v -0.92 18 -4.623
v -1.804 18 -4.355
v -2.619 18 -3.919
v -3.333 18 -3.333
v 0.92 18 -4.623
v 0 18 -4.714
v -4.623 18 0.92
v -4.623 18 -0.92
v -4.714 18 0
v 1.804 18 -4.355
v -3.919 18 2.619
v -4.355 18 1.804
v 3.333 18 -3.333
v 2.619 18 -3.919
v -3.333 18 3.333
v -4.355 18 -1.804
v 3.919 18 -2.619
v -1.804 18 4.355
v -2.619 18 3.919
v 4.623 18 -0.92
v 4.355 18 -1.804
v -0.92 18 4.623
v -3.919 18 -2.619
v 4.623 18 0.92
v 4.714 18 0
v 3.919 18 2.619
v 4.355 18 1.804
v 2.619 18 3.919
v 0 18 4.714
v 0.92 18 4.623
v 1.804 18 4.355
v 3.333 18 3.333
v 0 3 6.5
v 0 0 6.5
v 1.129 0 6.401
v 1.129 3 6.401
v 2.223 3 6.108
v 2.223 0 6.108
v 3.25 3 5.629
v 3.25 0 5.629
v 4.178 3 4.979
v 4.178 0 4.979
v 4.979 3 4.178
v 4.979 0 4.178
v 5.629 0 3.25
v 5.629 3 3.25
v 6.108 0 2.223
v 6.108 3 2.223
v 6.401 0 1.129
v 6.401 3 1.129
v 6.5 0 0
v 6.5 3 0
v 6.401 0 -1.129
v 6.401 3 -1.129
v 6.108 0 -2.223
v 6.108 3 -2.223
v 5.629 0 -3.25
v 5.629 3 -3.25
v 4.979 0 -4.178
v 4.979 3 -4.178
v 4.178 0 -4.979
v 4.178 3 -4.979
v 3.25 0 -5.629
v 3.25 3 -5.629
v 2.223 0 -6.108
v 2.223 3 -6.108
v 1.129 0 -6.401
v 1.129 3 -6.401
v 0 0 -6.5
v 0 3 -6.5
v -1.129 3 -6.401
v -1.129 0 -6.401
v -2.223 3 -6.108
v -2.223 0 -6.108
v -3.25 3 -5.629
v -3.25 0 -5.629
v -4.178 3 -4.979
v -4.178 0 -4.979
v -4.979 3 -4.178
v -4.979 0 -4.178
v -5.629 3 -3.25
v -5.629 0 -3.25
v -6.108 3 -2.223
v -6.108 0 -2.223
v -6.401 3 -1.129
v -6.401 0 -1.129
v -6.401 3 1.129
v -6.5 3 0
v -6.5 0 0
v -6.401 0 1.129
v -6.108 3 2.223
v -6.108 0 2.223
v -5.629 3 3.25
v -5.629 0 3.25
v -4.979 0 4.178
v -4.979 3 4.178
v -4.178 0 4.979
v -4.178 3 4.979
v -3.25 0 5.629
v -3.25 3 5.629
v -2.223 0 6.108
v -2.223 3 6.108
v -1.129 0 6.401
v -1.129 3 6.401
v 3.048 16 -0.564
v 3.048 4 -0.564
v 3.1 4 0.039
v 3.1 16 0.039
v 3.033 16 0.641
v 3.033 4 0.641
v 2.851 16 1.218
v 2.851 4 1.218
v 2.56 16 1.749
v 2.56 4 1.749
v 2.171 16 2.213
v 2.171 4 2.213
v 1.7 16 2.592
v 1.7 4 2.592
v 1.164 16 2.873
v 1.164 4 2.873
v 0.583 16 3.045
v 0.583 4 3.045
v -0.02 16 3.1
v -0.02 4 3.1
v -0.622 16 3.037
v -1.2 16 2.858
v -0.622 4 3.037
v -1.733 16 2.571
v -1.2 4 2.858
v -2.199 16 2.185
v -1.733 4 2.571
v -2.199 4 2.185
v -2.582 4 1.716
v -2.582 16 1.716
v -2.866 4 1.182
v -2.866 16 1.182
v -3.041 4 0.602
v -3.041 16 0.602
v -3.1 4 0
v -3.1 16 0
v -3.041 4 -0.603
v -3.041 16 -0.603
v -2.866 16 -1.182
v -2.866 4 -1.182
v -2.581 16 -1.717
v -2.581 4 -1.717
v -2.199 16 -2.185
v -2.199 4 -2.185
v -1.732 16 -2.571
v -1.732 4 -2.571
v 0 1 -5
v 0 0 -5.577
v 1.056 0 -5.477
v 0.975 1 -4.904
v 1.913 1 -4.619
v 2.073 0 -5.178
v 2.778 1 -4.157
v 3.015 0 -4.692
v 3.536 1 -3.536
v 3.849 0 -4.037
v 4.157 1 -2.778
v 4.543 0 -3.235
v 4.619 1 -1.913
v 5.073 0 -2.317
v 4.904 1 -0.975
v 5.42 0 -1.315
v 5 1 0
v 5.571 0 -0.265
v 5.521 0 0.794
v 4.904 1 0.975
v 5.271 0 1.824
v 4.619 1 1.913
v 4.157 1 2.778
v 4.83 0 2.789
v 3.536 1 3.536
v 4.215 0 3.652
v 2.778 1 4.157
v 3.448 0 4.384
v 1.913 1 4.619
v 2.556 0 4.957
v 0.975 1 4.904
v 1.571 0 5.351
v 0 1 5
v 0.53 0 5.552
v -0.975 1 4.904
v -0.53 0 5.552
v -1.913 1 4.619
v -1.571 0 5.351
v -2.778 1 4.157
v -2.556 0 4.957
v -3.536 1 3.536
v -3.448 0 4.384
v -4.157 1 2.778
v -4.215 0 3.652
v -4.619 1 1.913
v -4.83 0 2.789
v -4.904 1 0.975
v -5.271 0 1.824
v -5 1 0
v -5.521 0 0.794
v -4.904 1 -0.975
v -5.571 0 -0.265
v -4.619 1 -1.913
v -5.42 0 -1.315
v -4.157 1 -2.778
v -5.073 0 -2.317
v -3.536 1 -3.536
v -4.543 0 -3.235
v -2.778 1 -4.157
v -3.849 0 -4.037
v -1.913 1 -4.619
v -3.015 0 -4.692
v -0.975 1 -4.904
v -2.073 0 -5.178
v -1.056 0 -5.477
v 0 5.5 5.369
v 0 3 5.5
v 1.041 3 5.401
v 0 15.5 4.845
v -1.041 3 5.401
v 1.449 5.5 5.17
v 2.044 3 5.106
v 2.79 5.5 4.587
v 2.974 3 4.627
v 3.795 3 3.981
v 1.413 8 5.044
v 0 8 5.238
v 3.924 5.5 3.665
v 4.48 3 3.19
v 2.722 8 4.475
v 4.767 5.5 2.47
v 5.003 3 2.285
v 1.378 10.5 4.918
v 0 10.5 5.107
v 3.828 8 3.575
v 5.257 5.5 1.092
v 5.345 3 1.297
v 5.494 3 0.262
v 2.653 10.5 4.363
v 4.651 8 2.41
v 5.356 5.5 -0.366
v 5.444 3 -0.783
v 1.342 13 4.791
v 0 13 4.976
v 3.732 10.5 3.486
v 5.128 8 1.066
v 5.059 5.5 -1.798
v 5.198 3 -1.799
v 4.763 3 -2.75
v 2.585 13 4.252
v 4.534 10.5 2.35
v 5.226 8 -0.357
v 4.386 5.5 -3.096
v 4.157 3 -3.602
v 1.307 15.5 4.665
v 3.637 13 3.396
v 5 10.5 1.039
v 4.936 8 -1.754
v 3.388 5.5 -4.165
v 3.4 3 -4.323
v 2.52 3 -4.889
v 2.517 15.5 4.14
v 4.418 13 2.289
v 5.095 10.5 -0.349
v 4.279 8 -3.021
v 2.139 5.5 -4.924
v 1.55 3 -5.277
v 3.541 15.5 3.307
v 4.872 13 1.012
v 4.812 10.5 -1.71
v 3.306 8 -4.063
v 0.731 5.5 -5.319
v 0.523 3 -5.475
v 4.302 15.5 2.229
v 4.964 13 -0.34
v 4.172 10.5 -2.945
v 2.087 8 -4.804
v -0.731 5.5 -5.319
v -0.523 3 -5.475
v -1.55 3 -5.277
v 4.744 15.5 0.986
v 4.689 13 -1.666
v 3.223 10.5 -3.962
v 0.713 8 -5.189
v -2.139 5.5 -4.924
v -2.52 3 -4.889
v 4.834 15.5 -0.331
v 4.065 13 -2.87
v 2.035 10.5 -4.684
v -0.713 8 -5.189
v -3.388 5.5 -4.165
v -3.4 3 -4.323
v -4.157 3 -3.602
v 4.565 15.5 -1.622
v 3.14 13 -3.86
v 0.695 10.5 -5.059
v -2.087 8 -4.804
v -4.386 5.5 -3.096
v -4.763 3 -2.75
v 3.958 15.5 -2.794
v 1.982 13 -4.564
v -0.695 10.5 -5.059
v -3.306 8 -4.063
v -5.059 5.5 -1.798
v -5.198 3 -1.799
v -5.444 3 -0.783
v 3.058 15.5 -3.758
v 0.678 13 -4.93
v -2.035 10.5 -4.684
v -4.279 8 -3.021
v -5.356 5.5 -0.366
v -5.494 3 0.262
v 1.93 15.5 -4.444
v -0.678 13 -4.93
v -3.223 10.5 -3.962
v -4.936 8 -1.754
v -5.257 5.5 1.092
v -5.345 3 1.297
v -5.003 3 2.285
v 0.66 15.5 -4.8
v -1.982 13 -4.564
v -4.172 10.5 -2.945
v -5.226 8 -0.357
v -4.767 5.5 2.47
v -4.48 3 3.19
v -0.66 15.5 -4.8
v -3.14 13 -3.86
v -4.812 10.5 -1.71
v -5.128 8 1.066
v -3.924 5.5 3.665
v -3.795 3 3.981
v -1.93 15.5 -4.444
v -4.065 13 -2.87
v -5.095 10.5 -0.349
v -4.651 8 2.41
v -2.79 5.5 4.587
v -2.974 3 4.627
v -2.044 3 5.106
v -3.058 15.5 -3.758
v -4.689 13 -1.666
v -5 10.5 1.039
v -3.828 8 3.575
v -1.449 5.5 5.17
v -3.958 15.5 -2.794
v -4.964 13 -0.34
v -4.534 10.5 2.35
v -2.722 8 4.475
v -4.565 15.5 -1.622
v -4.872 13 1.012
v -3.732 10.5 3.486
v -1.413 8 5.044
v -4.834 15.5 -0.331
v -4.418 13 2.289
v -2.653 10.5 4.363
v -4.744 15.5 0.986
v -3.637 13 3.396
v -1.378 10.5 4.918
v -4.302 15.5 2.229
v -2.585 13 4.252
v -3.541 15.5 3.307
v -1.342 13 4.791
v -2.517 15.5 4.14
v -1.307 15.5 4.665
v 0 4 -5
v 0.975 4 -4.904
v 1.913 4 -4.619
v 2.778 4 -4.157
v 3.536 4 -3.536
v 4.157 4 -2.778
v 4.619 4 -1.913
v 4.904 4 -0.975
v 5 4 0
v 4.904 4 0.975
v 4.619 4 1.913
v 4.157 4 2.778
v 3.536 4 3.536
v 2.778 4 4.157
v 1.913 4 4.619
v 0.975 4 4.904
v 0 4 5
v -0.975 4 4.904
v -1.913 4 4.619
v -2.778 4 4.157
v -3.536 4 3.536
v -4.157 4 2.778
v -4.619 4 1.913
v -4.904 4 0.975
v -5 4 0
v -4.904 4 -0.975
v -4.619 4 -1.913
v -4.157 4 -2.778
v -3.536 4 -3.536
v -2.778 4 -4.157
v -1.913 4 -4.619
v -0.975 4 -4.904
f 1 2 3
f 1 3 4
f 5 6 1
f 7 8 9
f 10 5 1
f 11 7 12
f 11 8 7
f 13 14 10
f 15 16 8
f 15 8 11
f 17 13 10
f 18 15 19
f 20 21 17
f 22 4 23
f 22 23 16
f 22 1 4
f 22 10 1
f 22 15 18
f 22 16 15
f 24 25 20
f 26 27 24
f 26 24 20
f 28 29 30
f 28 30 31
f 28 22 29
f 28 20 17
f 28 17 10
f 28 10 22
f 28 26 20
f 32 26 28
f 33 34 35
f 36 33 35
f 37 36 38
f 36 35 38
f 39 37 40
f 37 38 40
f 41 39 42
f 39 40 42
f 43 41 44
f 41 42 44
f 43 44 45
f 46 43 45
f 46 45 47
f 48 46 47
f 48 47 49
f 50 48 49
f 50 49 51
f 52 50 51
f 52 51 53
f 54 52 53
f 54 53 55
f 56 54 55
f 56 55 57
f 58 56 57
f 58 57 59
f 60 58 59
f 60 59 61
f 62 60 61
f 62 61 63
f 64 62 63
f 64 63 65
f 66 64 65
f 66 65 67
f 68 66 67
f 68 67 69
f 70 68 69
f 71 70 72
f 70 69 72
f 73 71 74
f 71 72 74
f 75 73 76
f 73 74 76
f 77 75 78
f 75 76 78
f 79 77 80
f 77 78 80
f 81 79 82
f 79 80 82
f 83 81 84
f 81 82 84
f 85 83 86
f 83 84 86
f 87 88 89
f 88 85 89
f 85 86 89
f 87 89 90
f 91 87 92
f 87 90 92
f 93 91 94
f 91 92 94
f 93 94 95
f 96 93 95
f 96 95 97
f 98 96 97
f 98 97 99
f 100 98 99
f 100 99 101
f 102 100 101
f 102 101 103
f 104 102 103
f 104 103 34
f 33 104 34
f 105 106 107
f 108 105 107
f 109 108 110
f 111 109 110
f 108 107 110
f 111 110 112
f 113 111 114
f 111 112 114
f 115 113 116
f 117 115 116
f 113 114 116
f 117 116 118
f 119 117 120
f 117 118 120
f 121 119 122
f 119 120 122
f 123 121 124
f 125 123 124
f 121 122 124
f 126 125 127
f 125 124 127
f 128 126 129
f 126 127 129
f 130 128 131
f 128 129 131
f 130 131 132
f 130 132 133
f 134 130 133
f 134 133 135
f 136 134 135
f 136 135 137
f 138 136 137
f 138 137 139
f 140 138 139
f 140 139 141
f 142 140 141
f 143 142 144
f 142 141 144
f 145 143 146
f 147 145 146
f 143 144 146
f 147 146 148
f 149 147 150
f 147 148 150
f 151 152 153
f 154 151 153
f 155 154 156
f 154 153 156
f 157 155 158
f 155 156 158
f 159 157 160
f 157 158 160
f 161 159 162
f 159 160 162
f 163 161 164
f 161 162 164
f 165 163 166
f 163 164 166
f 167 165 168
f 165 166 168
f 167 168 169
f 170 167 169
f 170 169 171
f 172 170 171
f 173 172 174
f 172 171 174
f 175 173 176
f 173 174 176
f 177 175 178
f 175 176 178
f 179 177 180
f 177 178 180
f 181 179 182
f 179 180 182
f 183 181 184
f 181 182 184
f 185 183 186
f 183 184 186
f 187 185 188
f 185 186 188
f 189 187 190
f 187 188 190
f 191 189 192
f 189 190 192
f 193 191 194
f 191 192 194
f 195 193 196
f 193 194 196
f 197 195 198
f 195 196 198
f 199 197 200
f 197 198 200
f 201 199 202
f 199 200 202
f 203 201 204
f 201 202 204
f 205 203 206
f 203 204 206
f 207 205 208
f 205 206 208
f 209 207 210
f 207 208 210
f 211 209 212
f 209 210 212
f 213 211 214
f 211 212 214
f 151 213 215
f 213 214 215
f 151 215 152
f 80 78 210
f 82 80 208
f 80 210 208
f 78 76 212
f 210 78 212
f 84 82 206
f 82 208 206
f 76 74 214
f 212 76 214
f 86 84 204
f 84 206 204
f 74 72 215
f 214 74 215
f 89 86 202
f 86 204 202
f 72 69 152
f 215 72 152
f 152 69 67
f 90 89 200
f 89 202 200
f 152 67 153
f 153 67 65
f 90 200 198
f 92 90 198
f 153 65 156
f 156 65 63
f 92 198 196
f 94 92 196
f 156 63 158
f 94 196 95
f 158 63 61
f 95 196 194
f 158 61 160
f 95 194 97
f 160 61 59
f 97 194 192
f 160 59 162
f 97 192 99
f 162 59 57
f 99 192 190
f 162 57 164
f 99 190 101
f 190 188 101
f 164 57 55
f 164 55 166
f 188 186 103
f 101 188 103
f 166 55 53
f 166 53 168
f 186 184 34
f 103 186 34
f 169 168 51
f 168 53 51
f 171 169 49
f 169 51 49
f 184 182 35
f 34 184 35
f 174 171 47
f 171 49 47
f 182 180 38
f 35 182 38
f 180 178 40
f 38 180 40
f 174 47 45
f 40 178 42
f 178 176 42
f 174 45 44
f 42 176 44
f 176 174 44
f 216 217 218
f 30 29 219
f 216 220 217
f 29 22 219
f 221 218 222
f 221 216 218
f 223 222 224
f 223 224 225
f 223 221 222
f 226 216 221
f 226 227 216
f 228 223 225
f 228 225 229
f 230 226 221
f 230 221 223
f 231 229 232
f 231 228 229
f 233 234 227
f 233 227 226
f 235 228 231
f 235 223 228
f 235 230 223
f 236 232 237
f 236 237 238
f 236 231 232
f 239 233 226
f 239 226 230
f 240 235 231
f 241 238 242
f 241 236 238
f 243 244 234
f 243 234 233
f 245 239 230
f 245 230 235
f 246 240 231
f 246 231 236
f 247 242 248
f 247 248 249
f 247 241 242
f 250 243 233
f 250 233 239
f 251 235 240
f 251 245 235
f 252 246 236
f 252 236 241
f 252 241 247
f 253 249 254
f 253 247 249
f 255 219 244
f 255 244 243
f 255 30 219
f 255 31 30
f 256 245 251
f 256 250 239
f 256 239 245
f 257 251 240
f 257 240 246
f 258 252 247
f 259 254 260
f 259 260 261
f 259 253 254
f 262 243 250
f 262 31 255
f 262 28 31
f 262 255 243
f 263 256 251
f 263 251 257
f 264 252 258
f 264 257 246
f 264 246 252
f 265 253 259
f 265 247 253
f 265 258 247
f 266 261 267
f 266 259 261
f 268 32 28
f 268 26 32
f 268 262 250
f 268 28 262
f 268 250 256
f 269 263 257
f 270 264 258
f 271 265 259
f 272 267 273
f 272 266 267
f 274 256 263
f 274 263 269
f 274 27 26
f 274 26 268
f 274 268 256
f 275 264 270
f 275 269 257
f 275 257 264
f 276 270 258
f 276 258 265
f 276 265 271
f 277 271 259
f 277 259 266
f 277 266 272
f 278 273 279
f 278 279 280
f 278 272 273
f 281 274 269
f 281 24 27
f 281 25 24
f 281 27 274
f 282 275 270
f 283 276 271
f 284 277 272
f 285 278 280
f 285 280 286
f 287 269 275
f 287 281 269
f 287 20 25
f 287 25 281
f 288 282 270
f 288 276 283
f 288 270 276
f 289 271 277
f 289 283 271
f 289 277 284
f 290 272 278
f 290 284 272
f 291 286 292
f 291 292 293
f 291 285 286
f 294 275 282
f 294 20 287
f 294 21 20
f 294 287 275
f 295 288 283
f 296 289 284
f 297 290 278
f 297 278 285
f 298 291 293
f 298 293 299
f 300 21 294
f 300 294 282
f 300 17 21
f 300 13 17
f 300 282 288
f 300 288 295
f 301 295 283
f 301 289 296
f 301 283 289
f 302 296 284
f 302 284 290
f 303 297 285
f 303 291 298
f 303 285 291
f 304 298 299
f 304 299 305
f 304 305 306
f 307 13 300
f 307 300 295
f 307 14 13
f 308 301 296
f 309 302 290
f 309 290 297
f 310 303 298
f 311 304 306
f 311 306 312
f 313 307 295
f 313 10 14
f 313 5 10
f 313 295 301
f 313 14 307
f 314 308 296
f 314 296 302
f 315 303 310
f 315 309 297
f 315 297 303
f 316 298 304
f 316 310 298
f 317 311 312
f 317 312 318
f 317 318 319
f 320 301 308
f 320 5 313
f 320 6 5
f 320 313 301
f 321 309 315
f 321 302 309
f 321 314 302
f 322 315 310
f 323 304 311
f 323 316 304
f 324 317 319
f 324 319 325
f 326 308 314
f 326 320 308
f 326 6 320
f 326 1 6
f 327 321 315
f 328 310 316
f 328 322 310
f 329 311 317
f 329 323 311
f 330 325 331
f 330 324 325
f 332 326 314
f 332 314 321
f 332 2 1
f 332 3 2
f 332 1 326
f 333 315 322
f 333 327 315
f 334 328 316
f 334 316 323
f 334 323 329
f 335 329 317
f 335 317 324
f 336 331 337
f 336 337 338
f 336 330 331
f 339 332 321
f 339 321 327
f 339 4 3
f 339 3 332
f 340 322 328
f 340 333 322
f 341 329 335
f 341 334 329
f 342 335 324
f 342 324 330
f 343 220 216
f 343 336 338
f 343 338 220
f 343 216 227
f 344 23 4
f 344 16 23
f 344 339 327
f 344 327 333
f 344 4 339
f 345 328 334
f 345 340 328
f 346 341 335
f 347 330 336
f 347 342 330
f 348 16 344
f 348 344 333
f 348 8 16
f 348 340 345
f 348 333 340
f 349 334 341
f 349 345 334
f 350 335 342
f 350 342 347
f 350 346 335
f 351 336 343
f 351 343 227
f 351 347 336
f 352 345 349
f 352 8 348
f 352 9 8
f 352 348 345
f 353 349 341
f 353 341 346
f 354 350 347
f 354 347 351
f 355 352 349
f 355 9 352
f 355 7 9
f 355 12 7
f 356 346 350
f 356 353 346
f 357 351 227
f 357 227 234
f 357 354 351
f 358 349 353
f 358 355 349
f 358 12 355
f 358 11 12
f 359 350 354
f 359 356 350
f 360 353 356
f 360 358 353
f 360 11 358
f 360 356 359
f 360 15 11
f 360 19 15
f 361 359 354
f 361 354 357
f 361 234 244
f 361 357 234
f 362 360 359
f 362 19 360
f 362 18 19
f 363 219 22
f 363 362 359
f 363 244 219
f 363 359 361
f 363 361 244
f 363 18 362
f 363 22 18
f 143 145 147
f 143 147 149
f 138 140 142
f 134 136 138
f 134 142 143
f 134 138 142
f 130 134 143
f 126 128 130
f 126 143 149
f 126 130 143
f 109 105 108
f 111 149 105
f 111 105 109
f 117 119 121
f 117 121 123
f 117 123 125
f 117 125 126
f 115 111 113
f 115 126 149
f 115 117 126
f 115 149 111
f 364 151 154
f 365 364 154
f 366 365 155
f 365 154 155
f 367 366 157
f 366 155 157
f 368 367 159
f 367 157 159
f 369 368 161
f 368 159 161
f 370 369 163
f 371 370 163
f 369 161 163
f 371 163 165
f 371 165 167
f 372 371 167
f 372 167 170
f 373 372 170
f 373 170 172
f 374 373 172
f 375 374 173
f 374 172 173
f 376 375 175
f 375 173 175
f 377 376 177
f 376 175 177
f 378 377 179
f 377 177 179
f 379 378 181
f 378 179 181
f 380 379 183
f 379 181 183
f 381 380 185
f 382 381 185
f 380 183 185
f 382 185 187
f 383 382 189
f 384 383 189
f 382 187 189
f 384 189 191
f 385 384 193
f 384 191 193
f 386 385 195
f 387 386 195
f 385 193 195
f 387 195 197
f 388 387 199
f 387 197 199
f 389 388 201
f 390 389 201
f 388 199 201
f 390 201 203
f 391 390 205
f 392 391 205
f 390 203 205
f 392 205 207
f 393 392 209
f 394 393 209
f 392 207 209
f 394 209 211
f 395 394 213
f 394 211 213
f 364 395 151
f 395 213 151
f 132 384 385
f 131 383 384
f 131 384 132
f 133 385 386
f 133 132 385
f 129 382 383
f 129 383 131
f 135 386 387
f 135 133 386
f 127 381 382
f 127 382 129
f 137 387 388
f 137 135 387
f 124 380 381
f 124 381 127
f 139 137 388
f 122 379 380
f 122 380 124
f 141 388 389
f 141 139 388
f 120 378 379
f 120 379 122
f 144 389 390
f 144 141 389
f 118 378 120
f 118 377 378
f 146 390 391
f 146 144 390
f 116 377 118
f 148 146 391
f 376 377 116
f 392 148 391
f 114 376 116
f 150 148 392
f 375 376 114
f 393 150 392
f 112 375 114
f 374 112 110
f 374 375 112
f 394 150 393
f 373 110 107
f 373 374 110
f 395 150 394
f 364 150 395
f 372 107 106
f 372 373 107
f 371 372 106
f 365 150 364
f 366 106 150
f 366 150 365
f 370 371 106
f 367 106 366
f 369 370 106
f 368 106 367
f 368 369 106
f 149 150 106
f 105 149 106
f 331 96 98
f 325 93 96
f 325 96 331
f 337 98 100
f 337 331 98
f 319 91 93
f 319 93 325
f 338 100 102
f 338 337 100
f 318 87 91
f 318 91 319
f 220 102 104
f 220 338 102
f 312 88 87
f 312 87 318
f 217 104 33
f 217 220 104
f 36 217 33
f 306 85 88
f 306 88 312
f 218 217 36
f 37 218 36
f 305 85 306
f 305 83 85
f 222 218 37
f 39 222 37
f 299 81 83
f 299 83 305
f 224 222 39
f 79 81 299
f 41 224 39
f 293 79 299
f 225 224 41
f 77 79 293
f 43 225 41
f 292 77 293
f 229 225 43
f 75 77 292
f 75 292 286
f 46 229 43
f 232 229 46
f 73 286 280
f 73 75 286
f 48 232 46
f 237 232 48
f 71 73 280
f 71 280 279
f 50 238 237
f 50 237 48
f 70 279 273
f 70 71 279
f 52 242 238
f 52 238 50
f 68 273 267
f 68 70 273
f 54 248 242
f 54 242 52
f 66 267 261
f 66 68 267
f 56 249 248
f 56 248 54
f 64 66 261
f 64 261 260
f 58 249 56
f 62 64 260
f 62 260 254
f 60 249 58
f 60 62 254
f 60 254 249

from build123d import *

# Parameters (mm, degrees)
SKETCH1_R           = 6.5
BOSS_EXTRUDE1_DEPTH = 18
SKETCH2_R           = 5
CUT_EXTRUDE1_DEPTH  = 4
CUT_EXTRUDE2_DEPTH  = 12
CHAMFER1_SIZE       = 1
CHAMFER1_SIZE2      = 0.577350269
SKETCH4_OUTSIDE_W   = 20.146
SKETCH4_OUTSIDE_H   = 20.146
SKETCH4_OUTSIDE_R   = 5.5
CUT_EXTRUDE3_DEPTH  = 15
CHAMFER2_SIZE       = 15
CHAMFER2_SIZE_2     = 0.786116689


with BuildPart() as part:
    # Sketch1 → Boss-Extrude1 (new body)
    with BuildSketch(Plane(origin=(0, 0, 0), x_dir=(1, 0, 0), z_dir=(0, 1, 0))):
        with Locations(Location((0, 0, 0), (0, 0, 270))):
            Circle(SKETCH1_R)
    extrude(amount=BOSS_EXTRUDE1_DEPTH)

    # Sketch2 → Cut-Extrude1 (cut)
    with BuildSketch(Plane.XZ):
        with Locations(Location((0, 0, 0), (0, 0, 270))):
            Circle(SKETCH2_R)
    extrude(amount=-CUT_EXTRUDE1_DEPTH, mode=Mode.SUBTRACT)

    # Sketch3 → Cut-Extrude2 (cut)
    with BuildSketch(Plane.XZ.offset(-4)):
        with BuildLine():
            Line((-1.732055507, -2.57098886), (3.04828024, -0.563903873))
            ThreePointArc((3.04828024, -0.563903873), (-1.200087257, 2.858284551), (-1.732055507, -2.57098886))
        make_face()
    extrude(amount=-CUT_EXTRUDE2_DEPTH, mode=Mode.SUBTRACT)

    # Chamfer1
    chamfer1_edges = [part.edges().sort_by_distance(p)[0] for p in [
        (0, 0, 5),
    ]]
    chamfer1_side = [part.faces().sort_by_distance(p)[0] for p in [
        (0, 2, 5),
    ]]
    chamfer(chamfer1_edges, length=CHAMFER1_SIZE, length2=CHAMFER1_SIZE2, reference=chamfer1_side[0])

    # Sketch4 outside → Cut-Extrude3 (cut)
    with BuildSketch(Plane(origin=(0, 18, 0), x_dir=(1, 0, 0), z_dir=(0, 1, 0))):
        Rectangle(SKETCH4_OUTSIDE_W, SKETCH4_OUTSIDE_H)
        with Locations(Location((0, 0, 0), (0, 0, 270))):
            Circle(SKETCH4_OUTSIDE_R, mode=Mode.SUBTRACT)
    extrude(amount=-CUT_EXTRUDE3_DEPTH, mode=Mode.SUBTRACT)

    # Chamfer2
    # the kernel refuses this chamfer: 15, 0.786116689 mm, written as the material it takes off along each edge
    with BuildSketch(Plane(origin=(0, 18, 0), x_dir=(0, 0, 1), z_dir=(-1, 0, 0))) as chamfer2_piece_1_section:
        Polygon((5.5, -CHAMFER2_SIZE), (5.5 - CHAMFER2_SIZE_2, 0), (5.5, 0), align=None)
    chamfer2_piece_1 = revolve(axis=Axis((0, 18, 0), (0, 1, 0)), mode=Mode.PRIVATE)
    chamfer2_piece_1 = split(chamfer2_piece_1, bisect_by=Plane(origin=(0, 3, -5.162730795), z_dir=(0, 1, 0)), keep=Keep.TOP, mode=Mode.PRIVATE)
    add(chamfer2_piece_1, mode=Mode.SUBTRACT)


solid = part.part
